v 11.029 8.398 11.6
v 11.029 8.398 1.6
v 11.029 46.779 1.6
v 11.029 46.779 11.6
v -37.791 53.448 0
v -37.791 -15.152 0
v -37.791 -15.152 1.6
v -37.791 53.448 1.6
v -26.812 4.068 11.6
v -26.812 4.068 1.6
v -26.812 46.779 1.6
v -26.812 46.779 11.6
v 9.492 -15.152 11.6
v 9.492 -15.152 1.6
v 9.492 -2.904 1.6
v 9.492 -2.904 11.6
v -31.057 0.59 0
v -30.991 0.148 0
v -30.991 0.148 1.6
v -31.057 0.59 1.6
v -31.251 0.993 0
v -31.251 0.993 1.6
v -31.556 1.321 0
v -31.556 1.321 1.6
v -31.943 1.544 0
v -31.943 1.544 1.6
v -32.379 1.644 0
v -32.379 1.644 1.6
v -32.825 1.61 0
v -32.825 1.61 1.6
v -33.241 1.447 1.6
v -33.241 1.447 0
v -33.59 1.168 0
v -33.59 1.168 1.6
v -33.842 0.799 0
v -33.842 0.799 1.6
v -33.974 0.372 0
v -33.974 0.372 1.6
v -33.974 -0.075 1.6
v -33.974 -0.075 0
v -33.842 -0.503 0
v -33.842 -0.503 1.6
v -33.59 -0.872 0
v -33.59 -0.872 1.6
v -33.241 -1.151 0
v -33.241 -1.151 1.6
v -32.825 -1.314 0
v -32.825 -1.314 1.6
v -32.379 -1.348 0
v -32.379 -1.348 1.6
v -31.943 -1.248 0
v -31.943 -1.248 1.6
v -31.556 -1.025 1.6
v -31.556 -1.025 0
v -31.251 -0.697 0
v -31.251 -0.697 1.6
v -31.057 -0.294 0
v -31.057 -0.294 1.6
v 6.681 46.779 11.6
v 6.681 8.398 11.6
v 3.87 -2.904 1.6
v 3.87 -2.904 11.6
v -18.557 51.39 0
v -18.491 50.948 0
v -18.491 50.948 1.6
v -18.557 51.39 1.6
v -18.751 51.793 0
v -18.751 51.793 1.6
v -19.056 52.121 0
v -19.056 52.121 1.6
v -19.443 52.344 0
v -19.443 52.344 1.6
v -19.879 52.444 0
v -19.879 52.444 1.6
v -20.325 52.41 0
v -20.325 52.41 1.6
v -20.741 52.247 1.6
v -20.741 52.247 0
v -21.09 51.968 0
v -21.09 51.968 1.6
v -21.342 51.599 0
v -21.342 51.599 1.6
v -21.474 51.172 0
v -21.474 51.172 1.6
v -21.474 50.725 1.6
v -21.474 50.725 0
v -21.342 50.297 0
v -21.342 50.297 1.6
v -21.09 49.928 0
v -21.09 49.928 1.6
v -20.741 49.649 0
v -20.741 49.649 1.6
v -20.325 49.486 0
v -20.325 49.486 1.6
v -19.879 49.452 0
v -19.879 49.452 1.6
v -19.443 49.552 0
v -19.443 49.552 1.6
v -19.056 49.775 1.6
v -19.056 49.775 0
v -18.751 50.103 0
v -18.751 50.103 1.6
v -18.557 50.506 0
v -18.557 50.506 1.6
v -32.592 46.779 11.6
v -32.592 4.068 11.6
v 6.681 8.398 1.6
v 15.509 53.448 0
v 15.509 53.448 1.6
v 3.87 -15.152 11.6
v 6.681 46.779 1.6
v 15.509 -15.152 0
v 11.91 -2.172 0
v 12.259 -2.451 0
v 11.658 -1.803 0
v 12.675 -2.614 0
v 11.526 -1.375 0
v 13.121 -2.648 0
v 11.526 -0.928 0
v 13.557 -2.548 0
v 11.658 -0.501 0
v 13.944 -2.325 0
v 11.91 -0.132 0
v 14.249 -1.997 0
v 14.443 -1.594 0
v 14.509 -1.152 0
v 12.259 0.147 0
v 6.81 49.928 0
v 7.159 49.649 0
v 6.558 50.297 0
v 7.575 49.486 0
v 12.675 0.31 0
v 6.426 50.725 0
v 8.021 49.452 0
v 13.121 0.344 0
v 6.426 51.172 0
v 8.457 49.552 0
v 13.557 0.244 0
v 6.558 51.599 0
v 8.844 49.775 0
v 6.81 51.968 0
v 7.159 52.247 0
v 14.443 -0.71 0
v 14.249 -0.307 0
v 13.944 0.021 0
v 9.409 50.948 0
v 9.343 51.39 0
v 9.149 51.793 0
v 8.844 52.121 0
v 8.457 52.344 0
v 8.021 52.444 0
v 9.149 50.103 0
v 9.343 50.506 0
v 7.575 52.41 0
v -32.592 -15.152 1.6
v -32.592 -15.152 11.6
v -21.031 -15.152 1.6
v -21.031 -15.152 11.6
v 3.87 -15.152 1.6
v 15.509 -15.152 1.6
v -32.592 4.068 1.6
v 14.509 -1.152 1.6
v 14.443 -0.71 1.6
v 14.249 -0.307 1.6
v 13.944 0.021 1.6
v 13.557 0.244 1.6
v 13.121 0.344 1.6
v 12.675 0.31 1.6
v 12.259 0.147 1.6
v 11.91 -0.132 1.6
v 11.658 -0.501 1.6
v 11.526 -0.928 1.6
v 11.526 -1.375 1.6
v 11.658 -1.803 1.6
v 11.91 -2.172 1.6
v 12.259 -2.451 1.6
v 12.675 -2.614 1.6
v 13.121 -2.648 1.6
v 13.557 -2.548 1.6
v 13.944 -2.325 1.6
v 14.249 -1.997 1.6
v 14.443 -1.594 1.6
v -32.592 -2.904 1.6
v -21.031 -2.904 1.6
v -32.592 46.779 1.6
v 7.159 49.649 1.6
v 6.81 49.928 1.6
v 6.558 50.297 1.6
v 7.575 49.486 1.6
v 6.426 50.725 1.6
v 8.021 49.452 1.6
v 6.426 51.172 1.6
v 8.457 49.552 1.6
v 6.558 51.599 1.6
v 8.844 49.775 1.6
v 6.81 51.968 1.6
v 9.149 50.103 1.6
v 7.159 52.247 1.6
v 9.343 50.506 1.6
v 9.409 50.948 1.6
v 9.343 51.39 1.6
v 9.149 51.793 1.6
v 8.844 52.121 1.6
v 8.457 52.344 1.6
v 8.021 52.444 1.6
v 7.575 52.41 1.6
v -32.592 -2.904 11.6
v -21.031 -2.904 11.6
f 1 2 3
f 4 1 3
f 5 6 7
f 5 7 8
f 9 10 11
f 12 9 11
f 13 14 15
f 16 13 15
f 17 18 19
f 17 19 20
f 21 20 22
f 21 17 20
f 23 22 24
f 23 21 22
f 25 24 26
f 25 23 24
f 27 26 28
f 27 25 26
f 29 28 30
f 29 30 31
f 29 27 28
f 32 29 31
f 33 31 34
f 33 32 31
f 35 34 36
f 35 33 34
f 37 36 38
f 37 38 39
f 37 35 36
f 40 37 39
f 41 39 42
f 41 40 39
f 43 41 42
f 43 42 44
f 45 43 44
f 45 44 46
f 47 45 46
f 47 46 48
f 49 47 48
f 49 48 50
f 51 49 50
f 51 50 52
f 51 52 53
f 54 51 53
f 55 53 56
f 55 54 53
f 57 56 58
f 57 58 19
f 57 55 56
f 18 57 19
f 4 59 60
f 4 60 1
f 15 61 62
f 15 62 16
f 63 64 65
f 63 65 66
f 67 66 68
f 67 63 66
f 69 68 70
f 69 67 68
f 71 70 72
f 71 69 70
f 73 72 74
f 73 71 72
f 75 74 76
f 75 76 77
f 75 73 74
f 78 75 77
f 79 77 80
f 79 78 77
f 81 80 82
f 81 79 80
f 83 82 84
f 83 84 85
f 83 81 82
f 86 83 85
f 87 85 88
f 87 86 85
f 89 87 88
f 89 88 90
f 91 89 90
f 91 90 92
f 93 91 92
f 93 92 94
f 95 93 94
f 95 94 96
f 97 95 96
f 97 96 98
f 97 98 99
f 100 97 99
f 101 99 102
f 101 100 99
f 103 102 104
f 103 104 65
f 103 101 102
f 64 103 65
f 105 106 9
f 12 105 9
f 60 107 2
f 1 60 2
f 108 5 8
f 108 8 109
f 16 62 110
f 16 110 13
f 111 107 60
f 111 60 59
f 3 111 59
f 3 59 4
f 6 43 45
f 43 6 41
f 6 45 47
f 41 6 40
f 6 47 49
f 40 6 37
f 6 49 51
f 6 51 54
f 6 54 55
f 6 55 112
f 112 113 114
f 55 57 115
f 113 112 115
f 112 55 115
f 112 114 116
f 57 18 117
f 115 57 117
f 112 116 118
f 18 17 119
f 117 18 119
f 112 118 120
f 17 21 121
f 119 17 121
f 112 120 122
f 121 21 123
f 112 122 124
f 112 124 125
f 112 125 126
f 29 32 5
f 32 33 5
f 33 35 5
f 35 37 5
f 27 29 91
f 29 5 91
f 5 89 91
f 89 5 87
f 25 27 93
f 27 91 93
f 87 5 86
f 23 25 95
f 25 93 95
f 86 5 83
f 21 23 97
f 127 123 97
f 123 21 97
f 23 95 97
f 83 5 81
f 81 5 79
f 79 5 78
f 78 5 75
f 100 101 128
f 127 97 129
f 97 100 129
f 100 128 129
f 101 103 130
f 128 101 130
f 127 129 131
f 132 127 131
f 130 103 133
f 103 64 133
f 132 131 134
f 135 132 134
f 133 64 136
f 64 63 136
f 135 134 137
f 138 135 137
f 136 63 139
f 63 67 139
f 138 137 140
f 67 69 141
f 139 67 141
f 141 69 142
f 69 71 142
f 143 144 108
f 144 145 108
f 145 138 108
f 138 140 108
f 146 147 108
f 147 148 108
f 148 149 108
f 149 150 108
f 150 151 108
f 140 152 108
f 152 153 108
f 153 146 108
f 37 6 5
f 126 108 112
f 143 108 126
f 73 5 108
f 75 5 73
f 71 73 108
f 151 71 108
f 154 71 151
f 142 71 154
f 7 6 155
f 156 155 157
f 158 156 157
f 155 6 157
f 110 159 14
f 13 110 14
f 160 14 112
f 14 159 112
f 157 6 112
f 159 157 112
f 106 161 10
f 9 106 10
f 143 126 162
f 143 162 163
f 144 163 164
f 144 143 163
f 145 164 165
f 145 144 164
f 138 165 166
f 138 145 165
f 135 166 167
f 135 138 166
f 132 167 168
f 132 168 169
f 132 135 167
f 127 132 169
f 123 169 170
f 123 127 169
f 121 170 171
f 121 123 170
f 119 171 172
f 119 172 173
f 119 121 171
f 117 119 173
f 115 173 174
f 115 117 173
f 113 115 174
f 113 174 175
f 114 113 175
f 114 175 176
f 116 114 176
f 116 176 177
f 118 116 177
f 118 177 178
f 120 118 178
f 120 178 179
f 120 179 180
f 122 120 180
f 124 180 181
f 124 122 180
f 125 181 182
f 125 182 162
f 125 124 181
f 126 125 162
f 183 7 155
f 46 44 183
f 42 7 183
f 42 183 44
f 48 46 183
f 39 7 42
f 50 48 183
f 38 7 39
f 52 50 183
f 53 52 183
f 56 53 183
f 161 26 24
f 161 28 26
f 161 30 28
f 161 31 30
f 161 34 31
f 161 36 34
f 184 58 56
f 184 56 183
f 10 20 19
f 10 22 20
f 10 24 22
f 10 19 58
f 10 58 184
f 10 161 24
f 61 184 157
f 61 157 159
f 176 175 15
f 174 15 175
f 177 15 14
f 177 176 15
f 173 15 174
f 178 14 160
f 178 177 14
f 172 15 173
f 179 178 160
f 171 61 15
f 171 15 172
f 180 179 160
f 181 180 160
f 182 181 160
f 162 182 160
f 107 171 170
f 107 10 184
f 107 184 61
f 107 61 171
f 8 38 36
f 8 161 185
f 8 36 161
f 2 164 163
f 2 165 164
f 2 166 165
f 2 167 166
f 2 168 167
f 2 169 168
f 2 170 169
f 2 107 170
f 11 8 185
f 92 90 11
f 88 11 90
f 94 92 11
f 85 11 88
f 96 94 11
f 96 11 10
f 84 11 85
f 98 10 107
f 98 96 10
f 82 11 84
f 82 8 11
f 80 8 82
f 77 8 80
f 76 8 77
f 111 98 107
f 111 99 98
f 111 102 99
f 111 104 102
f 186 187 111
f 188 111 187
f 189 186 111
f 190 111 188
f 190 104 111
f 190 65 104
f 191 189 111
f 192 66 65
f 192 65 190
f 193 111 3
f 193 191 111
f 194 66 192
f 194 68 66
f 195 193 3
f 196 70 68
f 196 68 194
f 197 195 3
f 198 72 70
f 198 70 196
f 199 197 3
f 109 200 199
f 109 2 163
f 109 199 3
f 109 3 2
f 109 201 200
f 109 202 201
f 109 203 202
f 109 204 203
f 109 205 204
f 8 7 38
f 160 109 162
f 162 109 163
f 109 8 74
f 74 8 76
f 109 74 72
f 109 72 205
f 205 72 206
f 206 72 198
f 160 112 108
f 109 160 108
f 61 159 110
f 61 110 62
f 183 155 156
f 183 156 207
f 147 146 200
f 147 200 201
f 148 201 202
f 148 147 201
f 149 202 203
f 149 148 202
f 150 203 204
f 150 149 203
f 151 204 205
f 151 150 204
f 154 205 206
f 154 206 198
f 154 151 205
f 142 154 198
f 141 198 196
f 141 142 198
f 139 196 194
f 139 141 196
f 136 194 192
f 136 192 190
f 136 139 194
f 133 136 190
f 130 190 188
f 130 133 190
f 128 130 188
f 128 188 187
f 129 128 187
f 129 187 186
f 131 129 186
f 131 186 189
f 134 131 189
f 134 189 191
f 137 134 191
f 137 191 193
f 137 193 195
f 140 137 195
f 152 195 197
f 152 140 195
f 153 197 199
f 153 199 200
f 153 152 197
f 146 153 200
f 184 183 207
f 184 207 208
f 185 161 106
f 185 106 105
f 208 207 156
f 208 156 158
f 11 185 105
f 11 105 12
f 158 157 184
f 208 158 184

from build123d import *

# Parameters (mm, degrees)
SKETCH_1_W      = 53.3
SKETCH_1_H      = 68.6
SKETCH_1_R      = 1.5
EXTRUDE_1_DEPTH = 1.6
SKETCH_2_W      = 11.561255196
SKETCH_2_H      = 12.248286565
SKETCH_2_W_2    = 5.622199285
SKETCH_2_W_3    = 5.780627598
SKETCH_2_H_2    = 42.710987652
SKETCH_2_W_4    = 4.348124609
SKETCH_2_H_3    = 38.380226424
EXTRUDE_2_DEPTH = 10


with BuildPart() as part:
    # 草图1 → 凸台-拉伸1 (new body)
    with BuildSketch(Plane.XY):
        with Locations((-11.140811044, 19.148070952)):
            Rectangle(SKETCH_1_W, SKETCH_1_H)
        with Locations((-19.990811044, 50.948070952)):
            Circle(SKETCH_1_R, mode=Mode.SUBTRACT)
        with Locations((7.909188956, 50.948070952)):
            Circle(SKETCH_1_R, mode=Mode.SUBTRACT)
        with Locations((-32.490811044, 0.148070952)):
            Circle(SKETCH_1_R, mode=Mode.SUBTRACT)
        with Locations((13.009188956, -1.151929048)):
            Circle(SKETCH_1_R, mode=Mode.SUBTRACT)
    extrude(amount=EXTRUDE_1_DEPTH)

    # 草图2 → 凸台-拉伸2 (add)
    with BuildSketch(Plane.XY.offset(1.6)):
        with Locations((-26.811580019, -9.027785766)):
            Rectangle(SKETCH_2_W, SKETCH_2_H)
        with Locations((6.68110059, -9.027785766)):
            Rectangle(SKETCH_2_W_2, SKETCH_2_H)
        with Locations((-29.701893818, 25.423145352)):
            Rectangle(SKETCH_2_W_3, SKETCH_2_H_2)
        with Locations((8.855162896, 27.588525966)):
            Rectangle(SKETCH_2_W_4, SKETCH_2_H_3)
    extrude(amount=EXTRUDE_2_DEPTH)


solid = part.part
